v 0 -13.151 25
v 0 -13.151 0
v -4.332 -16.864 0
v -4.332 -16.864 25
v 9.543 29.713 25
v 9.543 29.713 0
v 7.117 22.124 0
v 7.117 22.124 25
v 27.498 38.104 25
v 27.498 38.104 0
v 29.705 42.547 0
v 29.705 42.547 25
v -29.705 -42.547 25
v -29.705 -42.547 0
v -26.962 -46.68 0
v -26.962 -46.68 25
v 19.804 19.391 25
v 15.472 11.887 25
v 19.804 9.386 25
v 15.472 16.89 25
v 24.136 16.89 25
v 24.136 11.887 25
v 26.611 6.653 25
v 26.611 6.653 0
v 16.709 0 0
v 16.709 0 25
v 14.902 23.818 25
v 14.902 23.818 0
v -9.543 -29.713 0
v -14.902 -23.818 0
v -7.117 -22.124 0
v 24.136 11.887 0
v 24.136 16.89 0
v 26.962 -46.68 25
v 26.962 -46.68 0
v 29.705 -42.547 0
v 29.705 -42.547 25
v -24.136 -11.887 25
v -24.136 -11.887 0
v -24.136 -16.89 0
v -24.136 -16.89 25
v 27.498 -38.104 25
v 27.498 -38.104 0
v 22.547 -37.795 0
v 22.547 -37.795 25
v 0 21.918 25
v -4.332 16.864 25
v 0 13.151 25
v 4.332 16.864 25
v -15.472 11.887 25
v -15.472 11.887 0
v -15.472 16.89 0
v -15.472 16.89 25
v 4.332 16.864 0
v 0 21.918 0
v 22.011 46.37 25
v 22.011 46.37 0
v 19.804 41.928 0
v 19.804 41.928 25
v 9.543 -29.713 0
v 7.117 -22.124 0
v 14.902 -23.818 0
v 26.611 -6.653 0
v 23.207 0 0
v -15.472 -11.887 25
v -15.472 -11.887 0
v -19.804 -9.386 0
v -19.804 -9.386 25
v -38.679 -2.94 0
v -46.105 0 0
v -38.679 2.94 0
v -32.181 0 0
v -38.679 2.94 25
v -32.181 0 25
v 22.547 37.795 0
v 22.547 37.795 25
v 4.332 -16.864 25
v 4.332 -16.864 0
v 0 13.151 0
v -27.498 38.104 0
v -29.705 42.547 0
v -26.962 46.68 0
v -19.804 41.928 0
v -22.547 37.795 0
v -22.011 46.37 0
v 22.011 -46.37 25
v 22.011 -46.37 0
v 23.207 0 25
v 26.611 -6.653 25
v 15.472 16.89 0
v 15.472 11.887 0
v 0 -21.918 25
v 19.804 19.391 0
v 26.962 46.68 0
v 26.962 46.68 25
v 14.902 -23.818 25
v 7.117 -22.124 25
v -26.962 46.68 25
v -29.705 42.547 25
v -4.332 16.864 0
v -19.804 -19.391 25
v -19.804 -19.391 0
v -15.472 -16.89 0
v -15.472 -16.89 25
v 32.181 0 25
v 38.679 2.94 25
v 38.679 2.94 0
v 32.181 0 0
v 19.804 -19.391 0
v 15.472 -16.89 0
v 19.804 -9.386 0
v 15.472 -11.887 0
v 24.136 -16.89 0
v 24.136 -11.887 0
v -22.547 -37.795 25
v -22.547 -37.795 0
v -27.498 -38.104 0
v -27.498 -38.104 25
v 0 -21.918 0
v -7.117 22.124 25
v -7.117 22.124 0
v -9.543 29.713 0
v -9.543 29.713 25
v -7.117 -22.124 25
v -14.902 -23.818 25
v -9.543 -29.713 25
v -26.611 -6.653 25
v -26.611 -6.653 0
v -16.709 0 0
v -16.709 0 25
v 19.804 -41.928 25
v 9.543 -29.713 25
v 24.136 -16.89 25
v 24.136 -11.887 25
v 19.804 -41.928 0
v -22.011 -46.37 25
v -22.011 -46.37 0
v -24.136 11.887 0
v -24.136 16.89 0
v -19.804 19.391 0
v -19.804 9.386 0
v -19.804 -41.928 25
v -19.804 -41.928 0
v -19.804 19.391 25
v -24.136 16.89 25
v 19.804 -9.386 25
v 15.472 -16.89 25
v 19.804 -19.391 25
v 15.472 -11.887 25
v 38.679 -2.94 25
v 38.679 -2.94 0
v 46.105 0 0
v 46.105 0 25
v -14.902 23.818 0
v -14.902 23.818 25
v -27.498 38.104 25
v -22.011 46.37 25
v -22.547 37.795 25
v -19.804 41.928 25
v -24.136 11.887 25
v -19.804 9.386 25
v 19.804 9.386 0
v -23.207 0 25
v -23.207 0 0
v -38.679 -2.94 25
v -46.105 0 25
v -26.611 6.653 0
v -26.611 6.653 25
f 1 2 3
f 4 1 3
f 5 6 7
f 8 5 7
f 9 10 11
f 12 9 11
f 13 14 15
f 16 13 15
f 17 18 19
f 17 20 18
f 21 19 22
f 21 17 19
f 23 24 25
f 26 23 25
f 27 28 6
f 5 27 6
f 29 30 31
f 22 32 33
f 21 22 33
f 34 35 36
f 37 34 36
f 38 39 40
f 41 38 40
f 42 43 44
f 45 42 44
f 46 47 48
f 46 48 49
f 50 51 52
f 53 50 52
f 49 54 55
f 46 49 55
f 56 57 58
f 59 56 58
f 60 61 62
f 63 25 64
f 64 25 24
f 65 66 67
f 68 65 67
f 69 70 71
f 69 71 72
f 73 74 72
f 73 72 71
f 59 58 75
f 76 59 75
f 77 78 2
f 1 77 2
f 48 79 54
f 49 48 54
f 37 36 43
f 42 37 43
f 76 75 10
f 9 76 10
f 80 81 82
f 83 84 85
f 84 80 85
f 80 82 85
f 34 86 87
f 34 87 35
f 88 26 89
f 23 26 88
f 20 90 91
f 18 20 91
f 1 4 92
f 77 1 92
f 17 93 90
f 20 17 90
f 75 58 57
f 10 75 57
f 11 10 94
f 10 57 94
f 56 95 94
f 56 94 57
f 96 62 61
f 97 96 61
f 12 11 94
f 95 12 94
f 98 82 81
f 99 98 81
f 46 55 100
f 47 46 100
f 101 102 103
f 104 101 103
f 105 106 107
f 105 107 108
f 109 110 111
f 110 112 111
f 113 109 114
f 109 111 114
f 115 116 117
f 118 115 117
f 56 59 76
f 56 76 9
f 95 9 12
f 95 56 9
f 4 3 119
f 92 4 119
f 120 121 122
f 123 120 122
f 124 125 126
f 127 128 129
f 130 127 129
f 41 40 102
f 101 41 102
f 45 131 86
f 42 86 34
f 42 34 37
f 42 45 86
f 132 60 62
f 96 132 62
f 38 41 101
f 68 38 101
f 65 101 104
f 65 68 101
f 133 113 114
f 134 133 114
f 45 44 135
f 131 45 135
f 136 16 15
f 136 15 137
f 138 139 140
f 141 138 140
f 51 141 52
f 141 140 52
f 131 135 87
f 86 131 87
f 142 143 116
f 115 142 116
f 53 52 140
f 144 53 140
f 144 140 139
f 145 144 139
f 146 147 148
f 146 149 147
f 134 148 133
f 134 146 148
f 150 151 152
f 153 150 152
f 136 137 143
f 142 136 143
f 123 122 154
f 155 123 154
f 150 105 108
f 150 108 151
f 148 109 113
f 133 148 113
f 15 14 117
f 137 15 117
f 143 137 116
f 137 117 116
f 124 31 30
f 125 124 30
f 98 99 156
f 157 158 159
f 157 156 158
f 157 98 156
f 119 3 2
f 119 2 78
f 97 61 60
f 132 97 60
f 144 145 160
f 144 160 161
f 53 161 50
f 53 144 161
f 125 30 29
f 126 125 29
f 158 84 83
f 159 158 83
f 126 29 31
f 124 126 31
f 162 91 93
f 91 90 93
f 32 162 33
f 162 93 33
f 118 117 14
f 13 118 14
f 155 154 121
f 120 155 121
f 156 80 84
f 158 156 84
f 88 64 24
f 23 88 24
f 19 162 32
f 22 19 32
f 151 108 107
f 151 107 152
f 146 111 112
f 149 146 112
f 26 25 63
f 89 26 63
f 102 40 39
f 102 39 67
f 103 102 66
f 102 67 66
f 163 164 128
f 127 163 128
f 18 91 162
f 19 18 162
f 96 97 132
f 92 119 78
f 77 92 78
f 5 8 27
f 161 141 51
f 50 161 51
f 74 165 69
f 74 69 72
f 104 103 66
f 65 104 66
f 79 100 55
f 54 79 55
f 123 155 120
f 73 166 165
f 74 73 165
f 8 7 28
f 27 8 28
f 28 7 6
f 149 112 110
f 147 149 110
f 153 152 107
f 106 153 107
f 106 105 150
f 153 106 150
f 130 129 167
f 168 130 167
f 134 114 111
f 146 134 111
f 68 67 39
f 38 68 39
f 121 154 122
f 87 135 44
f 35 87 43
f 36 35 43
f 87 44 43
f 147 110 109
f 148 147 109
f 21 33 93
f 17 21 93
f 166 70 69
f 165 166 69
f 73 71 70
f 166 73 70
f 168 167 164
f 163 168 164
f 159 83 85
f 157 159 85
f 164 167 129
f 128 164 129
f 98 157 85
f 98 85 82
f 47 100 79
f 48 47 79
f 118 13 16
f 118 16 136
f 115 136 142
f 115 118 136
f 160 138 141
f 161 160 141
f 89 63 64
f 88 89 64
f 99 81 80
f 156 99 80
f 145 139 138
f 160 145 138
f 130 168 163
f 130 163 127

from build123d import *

# Parameters (mm, degrees)
F2_DEPTH = 25


with BuildPart() as f2:
    # F1 (on face) → F2 (new body)
    with BuildSketch(Plane.XY):
        Polygon((-22.546954, 37.794926), (-19.803537, 41.927803), (-22.011005, 46.37011), (-26.96189, 46.67954), (-29.705307, 42.546663), (-27.497838, 38.104356), align=None)
        Polygon((-19.803537, -41.927803), (-22.546954, -37.794926), (-27.497838, -38.104356), (-29.705307, -42.546663), (-26.96189, -46.67954), (-22.011005, -46.37011), align=None)
        Polygon((19.803537, 41.927803), (22.546954, 37.794926), (27.497838, 38.104356), (29.705307, 42.546663), (26.96189, 46.67954), (22.011005, 46.37011), align=None)
        Polygon((27.497838, -38.104356), (22.546954, -37.794926), (19.803537, -41.927803), (22.011005, -46.37011), (26.96189, -46.67954), (29.705307, -42.546663), align=None)
        Polygon((-15.471513, 11.887412), (-15.471513, 16.889602), (-19.803537, 19.390697), (-24.135561, 16.889602), (-24.135561, 11.887412), (-19.803537, 9.386317), align=None)
        Polygon((-14.902241, 23.817999), (-7.116897, 22.124264), (-9.542752, 29.713437), align=None)
        Polygon((9.542752, 29.713437), (7.116897, 22.124264), (14.902241, 23.817999), align=None)
        Polygon((15.471513, 11.887412), (19.803537, 9.386317), (24.135561, 11.887412), (24.135561, 16.889602), (19.803537, 19.390697), (15.471513, 16.889602), align=None)
        Polygon((14.902241, -23.817999), (7.116897, -22.124264), (9.542752, -29.713437), align=None)
        Polygon((-14.902241, -23.817999), (-9.542752, -29.713437), (-7.116897, -22.124264), align=None)
        Polygon((-24.135561, -16.889602), (-19.803537, -19.390697), (-15.471513, -16.889602), (-15.471513, -11.887412), (-19.803537, -9.386317), (-24.135561, -11.887412), align=None)
        Polygon((15.471513, -16.889602), (19.803537, -19.390697), (24.135561, -16.889602), (24.135561, -11.887412), (19.803537, -9.386317), (15.471513, -11.887412), align=None)
        Polygon((-26.611004, -6.652751), (-16.709235, 0), (-26.611004, 6.652751), (-23.20727, 0), align=None)
        Polygon((-4.332023, 16.86395), (0, 13.150787), (4.332023, 16.86395), (0, 21.917976), align=None)
        Polygon((0, -13.150787), (-4.332023, -16.86395), (0, -21.917976), (4.332023, -16.86395), align=None)
        Polygon((26.611004, 6.652751), (16.709235, 0), (26.611004, -6.652751), (23.20727, 0), align=None)
        Polygon((-38.678784, 2.939587), (-46.105109, 0), (-38.678784, -2.939587), (-32.180749, 0), align=None)
        Polygon((46.105109, 0), (38.678784, 2.939587), (32.180749, 0), (38.678784, -2.939587), align=None)
    extrude(amount=F2_DEPTH)


solid = f2.part
